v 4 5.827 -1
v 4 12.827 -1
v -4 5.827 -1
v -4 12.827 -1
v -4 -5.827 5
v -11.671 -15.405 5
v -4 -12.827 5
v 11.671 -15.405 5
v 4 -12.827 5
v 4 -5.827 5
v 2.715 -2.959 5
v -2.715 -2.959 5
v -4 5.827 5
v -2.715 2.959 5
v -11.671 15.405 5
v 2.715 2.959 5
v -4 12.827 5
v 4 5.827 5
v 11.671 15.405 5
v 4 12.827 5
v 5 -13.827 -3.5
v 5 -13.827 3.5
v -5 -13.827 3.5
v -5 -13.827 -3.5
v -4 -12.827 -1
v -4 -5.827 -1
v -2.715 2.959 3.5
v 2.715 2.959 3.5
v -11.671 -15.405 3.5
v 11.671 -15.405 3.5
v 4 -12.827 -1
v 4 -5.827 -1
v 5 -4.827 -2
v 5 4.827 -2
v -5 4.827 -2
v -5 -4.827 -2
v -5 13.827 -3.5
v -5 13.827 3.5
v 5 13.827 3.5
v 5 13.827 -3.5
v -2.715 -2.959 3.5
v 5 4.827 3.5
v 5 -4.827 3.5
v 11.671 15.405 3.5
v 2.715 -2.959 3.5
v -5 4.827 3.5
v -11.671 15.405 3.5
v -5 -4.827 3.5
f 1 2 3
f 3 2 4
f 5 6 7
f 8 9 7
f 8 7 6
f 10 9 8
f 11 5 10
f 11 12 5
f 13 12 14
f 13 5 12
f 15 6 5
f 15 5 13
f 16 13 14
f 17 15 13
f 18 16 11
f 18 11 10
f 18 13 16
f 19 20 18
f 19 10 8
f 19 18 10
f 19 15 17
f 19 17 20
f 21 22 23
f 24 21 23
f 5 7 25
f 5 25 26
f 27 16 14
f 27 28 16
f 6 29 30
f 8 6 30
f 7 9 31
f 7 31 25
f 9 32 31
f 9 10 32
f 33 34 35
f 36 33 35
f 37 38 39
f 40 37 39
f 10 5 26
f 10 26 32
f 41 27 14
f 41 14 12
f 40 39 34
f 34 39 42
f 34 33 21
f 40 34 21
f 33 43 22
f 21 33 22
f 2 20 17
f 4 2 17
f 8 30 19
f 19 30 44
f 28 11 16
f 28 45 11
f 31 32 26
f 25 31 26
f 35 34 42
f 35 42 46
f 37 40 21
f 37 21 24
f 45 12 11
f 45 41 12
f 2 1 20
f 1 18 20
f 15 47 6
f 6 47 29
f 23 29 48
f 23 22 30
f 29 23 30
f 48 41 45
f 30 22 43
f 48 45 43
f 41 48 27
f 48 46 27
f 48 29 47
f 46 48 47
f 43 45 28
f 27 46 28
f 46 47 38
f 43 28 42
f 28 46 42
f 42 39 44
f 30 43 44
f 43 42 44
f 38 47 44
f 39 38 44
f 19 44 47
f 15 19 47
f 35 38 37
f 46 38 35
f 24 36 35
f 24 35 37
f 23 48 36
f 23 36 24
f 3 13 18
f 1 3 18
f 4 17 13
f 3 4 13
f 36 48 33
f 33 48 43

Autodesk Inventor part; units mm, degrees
ref_plane "Work Plane3" through (0, 0, 3.5) normal (0, 0, 1) x (1, 0, 0)
sketch "Sketch2" plane through (0, 0, 3.5) normal (0, 0, 1) x (1, 0, 0)
  line L0 (-11.6713, -15.4051) -> (11.6713, -15.4051)
  line L1 (11.6713, -15.4051) -> (11.6713, 15.4051)
  line L2 (11.6713, 15.4051) -> (-11.6713, 15.4051)
  line L3 (-11.6713, 15.4051) -> (-11.6713, -15.4051)
  line L4 (-11.6713, -15.4051) -> (11.6713, 15.4051) construction
  line L5 (11.6713, -15.4051) -> (-11.6713, 15.4051) construction
  point P0 (0, 0)
  dimension "d4" = 30.8102
  dimension "d5" = 23.3426
extrude "Extrusion2" add sketch "Sketch2" along normal blind 1.5
ref_plane "Work Plane2" through (0, 0, 0) normal (0, 0, -1) x (-1, 0, 0)
sketch "Sketch3" plane through (0, 0, 0) normal (0, 0, -1) x (-1, 0, 0)
  line L0 (-2.7149, 2.9592) -> (2.7149, 2.9592)
  line L1 (2.7149, 2.9592) -> (2.7149, -2.9592)
  line L2 (2.7149, -2.9592) -> (-2.7149, -2.9592)
  line L3 (-2.7149, -2.9592) -> (-2.7149, 2.9592)
  line L4 (-2.7149, 2.9592) -> (2.7149, -2.9592) construction
  line L5 (2.7149, 2.9592) -> (-2.7149, -2.9592) construction
  point P0 (0, 0)
extrude "Extrusion3" cut sketch "Sketch3" against normal blind 6
ref_plane "Work Plane1" through (0, 0, 0) normal (0, 0, -1) x (-1, 0, 0)
sketch "Sketch4" plane through (0, 0, 0) normal (0, 0, -1) x (-1, 0, 0)
  line L0 (8.89, -12.7) -> (-8.89, -12.7) projected
  line L1 (3.6472, 12.7) -> (-3.3528, 12.7)
  line L2 (-3.3528, 12.7) -> (-3.3528, 7.7)
  line L3 (-3.3528, 7.7) -> (3.6472, 7.7)
  line L4 (3.6472, 7.7) -> (3.6472, 12.7)
  line L5 (3.6472, 12.7) -> (-3.3528, 7.7) construction
  line L6 (-3.3528, 12.7) -> (3.6472, 7.7) construction
  line L7 (-8.89, -12.7) -> (-8.89, 12.7) projected
  line L8 (3.6472, -7.7) -> (-3.3528, -7.7)
  line L9 (-3.3528, -7.7) -> (-3.3528, -12.7)
  line L10 (-3.3528, -12.7) -> (3.6472, -12.7)
  line L11 (3.6472, -12.7) -> (3.6472, -7.7)
  line L12 (3.6472, -7.7) -> (-3.3528, -12.7) construction
  line L13 (-3.3528, -7.7) -> (3.6472, -12.7) construction
  line L14 (-8.89, 12.7) -> (8.89, 12.7) projected
  point P0 (0, 0)
  point P1 (0.1472, 10.2)
  point P2 (0.1472, -10.2)
  point P3 (-3.3528, -10.2)
  dimension "d10" = 7
  dimension "d11" = 5
  dimension "d12" = 5.5372
  dimension "d13" = 7
  dimension "d14" = 5
  dimension "d15" = 5.5372
  dimension "d16" = 0
  dimension "d17" = 0
extrude "Extrusion4" cut sketch "Sketch4" against normal blind 3.5
sketch "Sketch5" plane through (0, 0, 3.5) normal (0, 0, -1) x (-1, 0, 0)
  line L0 (11.6713, -15.4051) -> (-11.6713, -15.4051) projected
  line L1 (-4.0005, -12.827) -> (3.9995, -12.827)
  line L2 (3.9995, -12.827) -> (3.9995, -5.827)
  line L3 (3.9995, -5.827) -> (-4.0005, -5.827)
  line L4 (-4.0005, -5.827) -> (-4.0005, -12.827)
  line L5 (-11.6713, -15.4051) -> (-11.6713, 15.4051) projected
  line L6 (2.7149, -2.9592) -> (-2.7149, -2.9592) projected
  line L7 (9.017, -12.827) -> (-9.017, -12.827)
  line L8 (-9.017, -12.827) -> (-9.017, 12.827)
  line L9 (-9.017, 12.827) -> (9.017, 12.827)
  line L10 (9.017, 12.827) -> (9.017, -12.827)
  line L11 (9.017, -12.827) -> (-9.017, 12.827) construction
  line L12 (-9.017, -12.827) -> (9.017, 12.827) construction
  line L13 (3.9995, 5.827) -> (-4.0005, 5.827)
  line L14 (-4.0005, 5.827) -> (-4.0005, 12.827)
  line L15 (-4.0005, 12.827) -> (3.9995, 12.827)
  line L16 (3.9995, 12.827) -> (3.9995, 5.827)
  line L17 (3.9995, 5.827) -> (-4.0005, 12.827) construction
  line L18 (-4.0005, 5.827) -> (3.9995, 12.827) construction
  line L19 (11.6713, 15.4051) -> (11.6713, -15.4051) projected
  point P0 (0, 0)
  point P1 (-0.0005, 9.327)
  point P2 (3.9995, 12.827)
  dimension "d20" = 8
  dimension "d21" = 7
  dimension "d22" = 7.6708
  dimension "d25" = 18.034
  dimension "d26" = 25.654
  dimension "d27" = 0
  dimension "d28" = 7
  dimension "d29" = 8
  dimension "d31" = 7.6718
extrude "Extrusion5" add sketch "Sketch5" along normal blind 4.5 contours L4 L3 L2 L1 | L9 L16 L13 L14
sketch "Sketch6" plane through (0, 0, -1) normal (0, 0, -1) x (-1, 0, 0)
  line L0 (4.9995, 13.827) -> (-5.0005, 13.827)
  line L1 (-5.0005, 13.827) -> (-5.0005, 4.827)
  line L2 (-5.0005, 4.827) -> (4.9995, 4.827)
  line L3 (4.9995, 4.827) -> (4.9995, 13.827)
  line L4 (4.9995, -4.827) -> (-5.0005, -4.827)
  line L5 (-5.0005, -4.827) -> (-5.0005, -13.827)
  line L6 (-5.0005, -13.827) -> (4.9995, -13.827)
  line L7 (4.9995, -13.827) -> (4.9995, -4.827)
  line L8 (-4.0005, 5.827) -> (3.9995, 5.827) projected
  line L9 (3.9995, 12.827) -> (-4.0005, 12.827) projected
  line L10 (3.9995, 5.827) -> (3.9995, 12.827) projected
  line L11 (-4.0005, 12.827) -> (-4.0005, 5.827) projected
  line L12 (-4.0005, -12.827) -> (3.9995, -12.827) projected
  line L13 (3.9995, -5.827) -> (-4.0005, -5.827) projected
  point P0 (0, 0)
  dimension "d35" = 1
  dimension "d36" = 1
  dimension "d37" = 1
  dimension "d38" = 1
  dimension "d39" = 1
  dimension "d40" = 1
extrude "Extrusion6" add sketch "Sketch6" along normal blind 1 and the other way blind 4.5 contours L3 L2 L1 L0 | L7 L6 L5 L4 | L11 L9 L10 L8
extrude "Extrusion7" cut sketch "Sketch5" along normal blind 4.5 and the other way blind 1.5 contours L4 L3 L2 L1 | L9 L16 L13 L14
sketch "Sketch8" plane through (0, 0, -2) normal (0, 0, -1) x (-1, 0, 0)
  line L0 (4.9995, 13.827) -> (4.9995, 4.827) projected
  line L1 (-5.0005, -13.827) -> (4.9995, -13.827) projected
  line L2 (4.9995, 13.827) -> (-5.0005, 13.827)
  line L3 (-5.0005, 13.827) -> (-5.0005, -13.827)
  line L4 (-5.0005, -13.827) -> (4.9995, -13.827)
  line L5 (4.9995, -13.827) -> (4.9995, 13.827)
  point P0 (0, 0)
extrude "Extrusion8" add sketch "Sketch8" along normal blind 1.5
properties part number "newairtempguytop"
